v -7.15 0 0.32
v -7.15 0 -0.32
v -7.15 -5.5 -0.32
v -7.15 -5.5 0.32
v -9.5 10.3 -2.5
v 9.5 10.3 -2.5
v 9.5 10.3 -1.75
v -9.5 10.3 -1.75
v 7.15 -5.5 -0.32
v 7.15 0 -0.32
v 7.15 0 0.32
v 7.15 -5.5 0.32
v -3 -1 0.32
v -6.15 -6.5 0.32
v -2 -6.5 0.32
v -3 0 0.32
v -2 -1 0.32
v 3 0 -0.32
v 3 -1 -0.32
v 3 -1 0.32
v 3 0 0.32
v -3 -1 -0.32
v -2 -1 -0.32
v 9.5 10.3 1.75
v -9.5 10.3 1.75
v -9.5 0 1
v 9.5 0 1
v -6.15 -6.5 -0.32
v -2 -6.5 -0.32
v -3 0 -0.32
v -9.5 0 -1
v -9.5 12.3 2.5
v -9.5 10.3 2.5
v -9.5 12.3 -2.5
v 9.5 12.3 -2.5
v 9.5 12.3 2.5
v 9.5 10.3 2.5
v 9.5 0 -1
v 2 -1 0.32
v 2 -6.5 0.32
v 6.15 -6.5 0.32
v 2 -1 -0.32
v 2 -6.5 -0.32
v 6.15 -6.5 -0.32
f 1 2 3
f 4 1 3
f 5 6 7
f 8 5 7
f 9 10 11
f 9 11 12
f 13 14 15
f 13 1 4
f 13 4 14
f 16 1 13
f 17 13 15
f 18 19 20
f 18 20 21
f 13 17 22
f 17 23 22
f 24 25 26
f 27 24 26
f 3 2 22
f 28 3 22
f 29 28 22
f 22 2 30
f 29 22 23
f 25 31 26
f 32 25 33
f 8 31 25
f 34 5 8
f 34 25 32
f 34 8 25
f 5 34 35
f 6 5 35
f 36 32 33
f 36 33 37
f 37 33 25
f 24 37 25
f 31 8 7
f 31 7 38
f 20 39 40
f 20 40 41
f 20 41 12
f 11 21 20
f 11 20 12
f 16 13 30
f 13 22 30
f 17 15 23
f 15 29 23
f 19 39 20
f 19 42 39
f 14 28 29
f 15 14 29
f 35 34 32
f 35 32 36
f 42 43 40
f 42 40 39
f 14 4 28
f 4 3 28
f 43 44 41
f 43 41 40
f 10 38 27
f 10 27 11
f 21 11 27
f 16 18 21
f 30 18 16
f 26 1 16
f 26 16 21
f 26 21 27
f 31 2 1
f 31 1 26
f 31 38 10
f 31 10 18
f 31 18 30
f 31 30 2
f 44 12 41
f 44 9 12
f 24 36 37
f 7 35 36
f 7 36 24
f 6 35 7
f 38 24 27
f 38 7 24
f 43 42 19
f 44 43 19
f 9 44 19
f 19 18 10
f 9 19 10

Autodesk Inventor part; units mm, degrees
ref_plane "YZ Plane" through (0, 0, 0) normal (1, 0, 0) x (0, 1, 0)
ref_plane "XZ Plane" through (0, 0, 0) normal (0, 1, 0) x (-1, 0, 0)
ref_plane "XY Plane" through (0, 0, 0) normal (0, 0, 1) x (1, 0, 0)
sketch "Sketch1" plane through (0, 0, 0) normal (0, 0, 1) x (1, 0, 0)
  line L0 (-9.5, 12.3) -> (9.5, 12.3)
  line L1 (9.5, 12.3) -> (9.5, 0)
  line L2 (9.5, 0) -> (-9.5, 0)
  line L3 (-9.5, 0) -> (-9.5, 12.3)
  line L4 (-9.5, 12.3) -> (9.5, 0) construction
  line L5 (9.5, 12.3) -> (-9.5, 0) construction
  point P0 (0, 0)
  point P1 (0, 6.15)
  dimension "d0" = 12.3
  dimension "d1" = 19
  dimension "d2" = 0
  dimension "d3" = 12.3
extrude "Extrusion1" add sketch "Sketch1" along normal mid plane 5
sketch "Sketch2" plane through (0, 0, 0) normal (0, 0, 1) x (1, 0, 0)
  line L0 (-7.15, 1) -> (-7.15, -5.5)
  line L1 (-6.15, -6.5) -> (-2, -6.5)
  line L2 (-2, -6.5) -> (-2, -1)
  line L3 (-2, -1) -> (-3, -1)
  line L4 (-3, -1) -> (-3, 1)
  line L5 (-3, 1) -> (-7.15, 1)
  line L6 (-9.5, 0) -> (9.5, 0) projected
  line L7 (0, 0) -> (0, 7.1725) construction
  line L8 (-7.15, -5.5) -> (-6.15, -6.5)
  line L9 (7.15, 1) -> (7.15, -5.5)
  line L10 (6.15, -6.5) -> (2, -6.5)
  line L11 (2, -6.5) -> (2, -1)
  line L12 (2, -1) -> (3, -1)
  line L13 (3, -1) -> (3, 1)
  line L14 (3, 1) -> (7.15, 1)
  line L15 (7.15, -5.5) -> (6.15, -6.5)
  point P0 (-7.15, -6.5)
  point P1 (7.15, -6.5)
  dimension "d6" = 6.5
  dimension "d7" = 2
  dimension "d8" = 7.15
  dimension "d9" = 1
  dimension "d10" = 1
  dimension "d11" = 1
  dimension "d12" = 1
  dimension "d13" = 1
extrude "Extrusion2" add sketch "Sketch2" along normal mid plane 0.64
sketch "Sketch3" plane through (9.5, 0, 2.5) normal (1, 0, 0) x (0, 0, -1)
  line L0 (0, 12.3) -> (5, 12.3) projected
  line L1 (0, 0) -> (0, 12.3) projected
  line L2 (0, 0) -> (5, 0) projected
  line L3 (5, 12.3) -> (5, 0) projected
  line L4 (-1.5, 10.3) -> (0.75, 10.3)
  line L5 (0.75, 10.3) -> (1.5, 0)
  line L6 (-1.5, 10.3) -> (-1.5, -2)
  line L7 (-1.5, -2) -> (1.5, -2)
  line L8 (1.5, -2) -> (1.5, 0)
  line L9 (2.5, 0) -> (2.5, 10.8693) construction
  line L10 (6.5, 10.3) -> (4.25, 10.3)
  line L11 (4.25, 10.3) -> (3.5, 0)
  line L12 (6.5, 10.3) -> (6.5, -2)
  line L13 (6.5, -2) -> (3.5, -2)
  line L14 (3.5, 0) -> (3.5, -2)
  dimension "d16" = 2
  dimension "d17" = 0.75
  dimension "d18" = 1.5
  dimension "d19" = 2
  dimension "d20" = 1.5
extrude "Extrusion3" cut sketch "Sketch3" against normal through all contours L4 L5 L2 L1 | L1 L2 L8 L7 L6 L4 | L10 L12 L13 L14 L2 L3 | L3 L2 L11 L10
equation "\"d3\" = d0"
equation "\"d12\" = d11"
properties part number "ATCFuse"
